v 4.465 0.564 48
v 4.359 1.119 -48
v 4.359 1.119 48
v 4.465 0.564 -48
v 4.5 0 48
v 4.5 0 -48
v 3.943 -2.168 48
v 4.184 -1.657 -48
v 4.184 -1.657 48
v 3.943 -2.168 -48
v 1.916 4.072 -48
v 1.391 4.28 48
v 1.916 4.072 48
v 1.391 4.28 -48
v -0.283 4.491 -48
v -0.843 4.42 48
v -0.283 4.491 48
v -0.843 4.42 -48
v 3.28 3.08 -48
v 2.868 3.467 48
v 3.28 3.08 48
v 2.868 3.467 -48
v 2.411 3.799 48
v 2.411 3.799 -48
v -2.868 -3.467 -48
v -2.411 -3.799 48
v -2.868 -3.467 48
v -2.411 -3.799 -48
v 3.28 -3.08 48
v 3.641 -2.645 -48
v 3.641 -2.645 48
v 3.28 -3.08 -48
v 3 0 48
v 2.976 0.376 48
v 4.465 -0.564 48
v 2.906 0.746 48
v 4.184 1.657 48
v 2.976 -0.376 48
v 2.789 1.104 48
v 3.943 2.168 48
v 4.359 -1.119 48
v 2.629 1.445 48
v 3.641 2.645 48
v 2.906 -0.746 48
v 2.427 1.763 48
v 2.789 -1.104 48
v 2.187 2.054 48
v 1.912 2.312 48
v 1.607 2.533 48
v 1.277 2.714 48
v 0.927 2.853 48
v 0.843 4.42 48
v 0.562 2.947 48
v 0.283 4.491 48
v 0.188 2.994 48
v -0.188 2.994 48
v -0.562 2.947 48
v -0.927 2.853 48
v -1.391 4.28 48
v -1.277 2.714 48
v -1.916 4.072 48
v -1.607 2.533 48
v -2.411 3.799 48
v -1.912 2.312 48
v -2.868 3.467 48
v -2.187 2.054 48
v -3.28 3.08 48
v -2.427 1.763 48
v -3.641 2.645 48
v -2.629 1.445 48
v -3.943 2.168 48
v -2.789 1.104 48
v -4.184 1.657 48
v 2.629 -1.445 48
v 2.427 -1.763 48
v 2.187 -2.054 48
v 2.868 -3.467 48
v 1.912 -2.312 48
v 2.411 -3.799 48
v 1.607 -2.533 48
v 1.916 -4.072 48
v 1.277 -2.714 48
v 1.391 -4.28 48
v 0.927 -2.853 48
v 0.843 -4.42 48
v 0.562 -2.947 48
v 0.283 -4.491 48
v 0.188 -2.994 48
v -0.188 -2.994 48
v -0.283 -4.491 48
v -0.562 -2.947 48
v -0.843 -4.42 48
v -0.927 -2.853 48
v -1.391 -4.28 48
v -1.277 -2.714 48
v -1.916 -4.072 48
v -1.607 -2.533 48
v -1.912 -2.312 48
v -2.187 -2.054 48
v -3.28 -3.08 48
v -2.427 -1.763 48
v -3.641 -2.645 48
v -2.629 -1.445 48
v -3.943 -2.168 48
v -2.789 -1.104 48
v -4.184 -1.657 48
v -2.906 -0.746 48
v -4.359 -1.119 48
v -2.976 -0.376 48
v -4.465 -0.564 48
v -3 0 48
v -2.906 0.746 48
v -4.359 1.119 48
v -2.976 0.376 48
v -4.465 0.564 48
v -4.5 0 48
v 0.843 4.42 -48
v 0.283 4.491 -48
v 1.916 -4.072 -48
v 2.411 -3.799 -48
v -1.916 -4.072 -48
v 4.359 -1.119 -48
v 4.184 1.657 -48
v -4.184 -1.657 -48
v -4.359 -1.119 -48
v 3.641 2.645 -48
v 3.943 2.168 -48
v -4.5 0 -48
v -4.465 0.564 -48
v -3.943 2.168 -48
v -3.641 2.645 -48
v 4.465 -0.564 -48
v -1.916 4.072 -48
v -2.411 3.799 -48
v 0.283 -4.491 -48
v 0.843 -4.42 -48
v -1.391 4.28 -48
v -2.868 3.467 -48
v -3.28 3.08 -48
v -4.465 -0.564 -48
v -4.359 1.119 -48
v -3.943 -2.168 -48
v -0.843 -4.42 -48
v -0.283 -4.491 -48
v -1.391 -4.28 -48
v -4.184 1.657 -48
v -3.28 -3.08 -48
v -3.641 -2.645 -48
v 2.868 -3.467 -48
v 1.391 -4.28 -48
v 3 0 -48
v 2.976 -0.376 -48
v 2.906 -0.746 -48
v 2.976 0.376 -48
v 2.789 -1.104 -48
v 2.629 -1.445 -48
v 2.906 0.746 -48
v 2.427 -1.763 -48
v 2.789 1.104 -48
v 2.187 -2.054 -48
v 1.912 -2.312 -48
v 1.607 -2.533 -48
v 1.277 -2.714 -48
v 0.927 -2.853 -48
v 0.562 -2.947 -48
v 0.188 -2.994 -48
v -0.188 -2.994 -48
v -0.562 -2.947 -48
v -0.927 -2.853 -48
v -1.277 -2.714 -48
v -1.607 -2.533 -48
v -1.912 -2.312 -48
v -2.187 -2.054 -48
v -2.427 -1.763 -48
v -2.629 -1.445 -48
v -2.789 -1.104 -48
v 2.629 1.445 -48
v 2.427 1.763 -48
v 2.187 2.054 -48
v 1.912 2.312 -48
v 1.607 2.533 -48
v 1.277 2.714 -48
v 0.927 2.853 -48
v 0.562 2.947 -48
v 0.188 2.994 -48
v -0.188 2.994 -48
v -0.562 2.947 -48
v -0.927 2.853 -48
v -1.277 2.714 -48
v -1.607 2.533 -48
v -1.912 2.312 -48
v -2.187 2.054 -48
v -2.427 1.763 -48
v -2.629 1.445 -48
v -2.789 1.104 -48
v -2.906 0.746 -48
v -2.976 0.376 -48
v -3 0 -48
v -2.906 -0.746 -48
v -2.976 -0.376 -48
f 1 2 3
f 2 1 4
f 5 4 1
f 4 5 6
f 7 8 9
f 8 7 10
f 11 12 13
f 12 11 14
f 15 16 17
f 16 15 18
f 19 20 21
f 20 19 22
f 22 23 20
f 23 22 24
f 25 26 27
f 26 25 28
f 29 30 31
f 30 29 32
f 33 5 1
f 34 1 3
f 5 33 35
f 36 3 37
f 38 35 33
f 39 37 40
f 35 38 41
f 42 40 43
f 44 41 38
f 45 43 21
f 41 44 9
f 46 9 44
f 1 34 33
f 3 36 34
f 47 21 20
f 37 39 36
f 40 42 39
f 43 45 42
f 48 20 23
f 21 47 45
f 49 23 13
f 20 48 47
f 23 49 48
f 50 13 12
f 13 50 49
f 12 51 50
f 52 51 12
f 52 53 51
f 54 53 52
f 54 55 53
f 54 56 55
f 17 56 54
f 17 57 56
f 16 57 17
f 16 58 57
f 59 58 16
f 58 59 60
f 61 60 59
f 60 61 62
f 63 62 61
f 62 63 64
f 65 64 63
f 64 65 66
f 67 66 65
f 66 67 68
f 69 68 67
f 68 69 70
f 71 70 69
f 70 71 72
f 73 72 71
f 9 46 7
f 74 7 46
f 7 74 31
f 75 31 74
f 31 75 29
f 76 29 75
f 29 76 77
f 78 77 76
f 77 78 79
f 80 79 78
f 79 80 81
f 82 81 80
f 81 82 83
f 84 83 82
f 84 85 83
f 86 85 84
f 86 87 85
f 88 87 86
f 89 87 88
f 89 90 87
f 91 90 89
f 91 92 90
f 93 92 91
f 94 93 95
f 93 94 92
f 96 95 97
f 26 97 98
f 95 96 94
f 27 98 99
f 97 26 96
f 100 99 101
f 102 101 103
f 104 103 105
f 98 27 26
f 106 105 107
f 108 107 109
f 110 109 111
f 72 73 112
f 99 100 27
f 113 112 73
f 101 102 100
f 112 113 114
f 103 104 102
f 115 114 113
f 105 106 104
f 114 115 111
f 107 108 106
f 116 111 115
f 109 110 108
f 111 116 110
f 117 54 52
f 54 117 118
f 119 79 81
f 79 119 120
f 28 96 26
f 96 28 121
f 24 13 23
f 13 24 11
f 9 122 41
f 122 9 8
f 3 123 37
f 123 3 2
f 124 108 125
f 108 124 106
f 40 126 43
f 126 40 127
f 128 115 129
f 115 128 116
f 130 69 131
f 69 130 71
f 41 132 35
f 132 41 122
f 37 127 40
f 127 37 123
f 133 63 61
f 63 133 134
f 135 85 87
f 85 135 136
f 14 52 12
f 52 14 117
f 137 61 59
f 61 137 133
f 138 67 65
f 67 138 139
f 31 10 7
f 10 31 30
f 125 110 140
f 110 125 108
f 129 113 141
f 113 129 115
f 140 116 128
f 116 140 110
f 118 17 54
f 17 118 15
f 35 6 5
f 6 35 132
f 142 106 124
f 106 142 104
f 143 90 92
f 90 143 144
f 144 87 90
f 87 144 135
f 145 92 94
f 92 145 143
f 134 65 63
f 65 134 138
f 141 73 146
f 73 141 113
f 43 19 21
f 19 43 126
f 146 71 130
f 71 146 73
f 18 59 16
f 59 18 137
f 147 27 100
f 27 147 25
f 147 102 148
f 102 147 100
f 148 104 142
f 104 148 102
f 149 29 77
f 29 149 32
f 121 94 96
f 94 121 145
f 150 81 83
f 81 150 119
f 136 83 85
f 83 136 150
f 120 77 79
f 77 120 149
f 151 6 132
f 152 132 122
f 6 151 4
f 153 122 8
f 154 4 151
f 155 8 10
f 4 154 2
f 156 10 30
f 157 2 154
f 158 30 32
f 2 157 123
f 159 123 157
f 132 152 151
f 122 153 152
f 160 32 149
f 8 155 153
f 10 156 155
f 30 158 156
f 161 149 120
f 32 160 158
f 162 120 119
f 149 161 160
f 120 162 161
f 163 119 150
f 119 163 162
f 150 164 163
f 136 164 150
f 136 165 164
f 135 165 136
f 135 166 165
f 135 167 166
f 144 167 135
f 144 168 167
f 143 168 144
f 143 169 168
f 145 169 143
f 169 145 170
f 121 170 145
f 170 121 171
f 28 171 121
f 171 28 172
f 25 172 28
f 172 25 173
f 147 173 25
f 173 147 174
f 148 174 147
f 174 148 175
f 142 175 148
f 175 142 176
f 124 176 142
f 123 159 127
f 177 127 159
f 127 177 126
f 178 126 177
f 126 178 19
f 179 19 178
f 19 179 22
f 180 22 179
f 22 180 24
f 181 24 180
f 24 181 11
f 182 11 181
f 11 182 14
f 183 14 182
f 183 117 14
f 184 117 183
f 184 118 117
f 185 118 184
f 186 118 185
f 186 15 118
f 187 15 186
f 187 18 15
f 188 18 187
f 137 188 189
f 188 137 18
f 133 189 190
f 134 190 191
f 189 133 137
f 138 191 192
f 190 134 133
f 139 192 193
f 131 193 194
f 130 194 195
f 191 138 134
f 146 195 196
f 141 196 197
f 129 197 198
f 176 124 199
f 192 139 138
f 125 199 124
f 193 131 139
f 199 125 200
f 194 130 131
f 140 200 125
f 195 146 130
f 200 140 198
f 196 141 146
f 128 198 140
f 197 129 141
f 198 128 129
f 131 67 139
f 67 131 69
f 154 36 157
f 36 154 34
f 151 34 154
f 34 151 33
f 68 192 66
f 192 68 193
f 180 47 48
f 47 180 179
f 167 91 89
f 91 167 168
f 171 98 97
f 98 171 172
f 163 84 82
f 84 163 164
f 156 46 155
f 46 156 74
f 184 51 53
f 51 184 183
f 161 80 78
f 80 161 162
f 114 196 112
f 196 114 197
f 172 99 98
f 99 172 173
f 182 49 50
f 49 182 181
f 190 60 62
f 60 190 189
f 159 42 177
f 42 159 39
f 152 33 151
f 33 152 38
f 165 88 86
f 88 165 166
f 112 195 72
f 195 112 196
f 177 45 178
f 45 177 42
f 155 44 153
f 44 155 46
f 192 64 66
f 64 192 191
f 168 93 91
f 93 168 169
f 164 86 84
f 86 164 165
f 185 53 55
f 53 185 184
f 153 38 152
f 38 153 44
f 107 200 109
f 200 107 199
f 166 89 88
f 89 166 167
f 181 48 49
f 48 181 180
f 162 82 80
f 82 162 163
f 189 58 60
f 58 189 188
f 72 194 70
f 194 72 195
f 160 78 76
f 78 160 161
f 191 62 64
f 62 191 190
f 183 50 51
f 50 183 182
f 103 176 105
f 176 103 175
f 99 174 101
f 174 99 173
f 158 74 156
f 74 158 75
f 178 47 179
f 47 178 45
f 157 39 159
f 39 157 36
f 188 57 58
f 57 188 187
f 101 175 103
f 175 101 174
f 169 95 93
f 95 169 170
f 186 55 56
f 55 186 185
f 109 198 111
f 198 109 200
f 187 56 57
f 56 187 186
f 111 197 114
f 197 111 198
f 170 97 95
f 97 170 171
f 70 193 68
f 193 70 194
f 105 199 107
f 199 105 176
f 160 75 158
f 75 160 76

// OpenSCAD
$fn = 50;


difference() {
	union() {
		translate(v = [0, 0, -48.0000000000]) {
			cylinder(h = 96, r = 4.5000000000);
		}
	}
	union() {
		translate(v = [0, 0, -100.0000000000]) {
			cylinder(h = 200, r = 3.0000000000);
		}
	}
}
